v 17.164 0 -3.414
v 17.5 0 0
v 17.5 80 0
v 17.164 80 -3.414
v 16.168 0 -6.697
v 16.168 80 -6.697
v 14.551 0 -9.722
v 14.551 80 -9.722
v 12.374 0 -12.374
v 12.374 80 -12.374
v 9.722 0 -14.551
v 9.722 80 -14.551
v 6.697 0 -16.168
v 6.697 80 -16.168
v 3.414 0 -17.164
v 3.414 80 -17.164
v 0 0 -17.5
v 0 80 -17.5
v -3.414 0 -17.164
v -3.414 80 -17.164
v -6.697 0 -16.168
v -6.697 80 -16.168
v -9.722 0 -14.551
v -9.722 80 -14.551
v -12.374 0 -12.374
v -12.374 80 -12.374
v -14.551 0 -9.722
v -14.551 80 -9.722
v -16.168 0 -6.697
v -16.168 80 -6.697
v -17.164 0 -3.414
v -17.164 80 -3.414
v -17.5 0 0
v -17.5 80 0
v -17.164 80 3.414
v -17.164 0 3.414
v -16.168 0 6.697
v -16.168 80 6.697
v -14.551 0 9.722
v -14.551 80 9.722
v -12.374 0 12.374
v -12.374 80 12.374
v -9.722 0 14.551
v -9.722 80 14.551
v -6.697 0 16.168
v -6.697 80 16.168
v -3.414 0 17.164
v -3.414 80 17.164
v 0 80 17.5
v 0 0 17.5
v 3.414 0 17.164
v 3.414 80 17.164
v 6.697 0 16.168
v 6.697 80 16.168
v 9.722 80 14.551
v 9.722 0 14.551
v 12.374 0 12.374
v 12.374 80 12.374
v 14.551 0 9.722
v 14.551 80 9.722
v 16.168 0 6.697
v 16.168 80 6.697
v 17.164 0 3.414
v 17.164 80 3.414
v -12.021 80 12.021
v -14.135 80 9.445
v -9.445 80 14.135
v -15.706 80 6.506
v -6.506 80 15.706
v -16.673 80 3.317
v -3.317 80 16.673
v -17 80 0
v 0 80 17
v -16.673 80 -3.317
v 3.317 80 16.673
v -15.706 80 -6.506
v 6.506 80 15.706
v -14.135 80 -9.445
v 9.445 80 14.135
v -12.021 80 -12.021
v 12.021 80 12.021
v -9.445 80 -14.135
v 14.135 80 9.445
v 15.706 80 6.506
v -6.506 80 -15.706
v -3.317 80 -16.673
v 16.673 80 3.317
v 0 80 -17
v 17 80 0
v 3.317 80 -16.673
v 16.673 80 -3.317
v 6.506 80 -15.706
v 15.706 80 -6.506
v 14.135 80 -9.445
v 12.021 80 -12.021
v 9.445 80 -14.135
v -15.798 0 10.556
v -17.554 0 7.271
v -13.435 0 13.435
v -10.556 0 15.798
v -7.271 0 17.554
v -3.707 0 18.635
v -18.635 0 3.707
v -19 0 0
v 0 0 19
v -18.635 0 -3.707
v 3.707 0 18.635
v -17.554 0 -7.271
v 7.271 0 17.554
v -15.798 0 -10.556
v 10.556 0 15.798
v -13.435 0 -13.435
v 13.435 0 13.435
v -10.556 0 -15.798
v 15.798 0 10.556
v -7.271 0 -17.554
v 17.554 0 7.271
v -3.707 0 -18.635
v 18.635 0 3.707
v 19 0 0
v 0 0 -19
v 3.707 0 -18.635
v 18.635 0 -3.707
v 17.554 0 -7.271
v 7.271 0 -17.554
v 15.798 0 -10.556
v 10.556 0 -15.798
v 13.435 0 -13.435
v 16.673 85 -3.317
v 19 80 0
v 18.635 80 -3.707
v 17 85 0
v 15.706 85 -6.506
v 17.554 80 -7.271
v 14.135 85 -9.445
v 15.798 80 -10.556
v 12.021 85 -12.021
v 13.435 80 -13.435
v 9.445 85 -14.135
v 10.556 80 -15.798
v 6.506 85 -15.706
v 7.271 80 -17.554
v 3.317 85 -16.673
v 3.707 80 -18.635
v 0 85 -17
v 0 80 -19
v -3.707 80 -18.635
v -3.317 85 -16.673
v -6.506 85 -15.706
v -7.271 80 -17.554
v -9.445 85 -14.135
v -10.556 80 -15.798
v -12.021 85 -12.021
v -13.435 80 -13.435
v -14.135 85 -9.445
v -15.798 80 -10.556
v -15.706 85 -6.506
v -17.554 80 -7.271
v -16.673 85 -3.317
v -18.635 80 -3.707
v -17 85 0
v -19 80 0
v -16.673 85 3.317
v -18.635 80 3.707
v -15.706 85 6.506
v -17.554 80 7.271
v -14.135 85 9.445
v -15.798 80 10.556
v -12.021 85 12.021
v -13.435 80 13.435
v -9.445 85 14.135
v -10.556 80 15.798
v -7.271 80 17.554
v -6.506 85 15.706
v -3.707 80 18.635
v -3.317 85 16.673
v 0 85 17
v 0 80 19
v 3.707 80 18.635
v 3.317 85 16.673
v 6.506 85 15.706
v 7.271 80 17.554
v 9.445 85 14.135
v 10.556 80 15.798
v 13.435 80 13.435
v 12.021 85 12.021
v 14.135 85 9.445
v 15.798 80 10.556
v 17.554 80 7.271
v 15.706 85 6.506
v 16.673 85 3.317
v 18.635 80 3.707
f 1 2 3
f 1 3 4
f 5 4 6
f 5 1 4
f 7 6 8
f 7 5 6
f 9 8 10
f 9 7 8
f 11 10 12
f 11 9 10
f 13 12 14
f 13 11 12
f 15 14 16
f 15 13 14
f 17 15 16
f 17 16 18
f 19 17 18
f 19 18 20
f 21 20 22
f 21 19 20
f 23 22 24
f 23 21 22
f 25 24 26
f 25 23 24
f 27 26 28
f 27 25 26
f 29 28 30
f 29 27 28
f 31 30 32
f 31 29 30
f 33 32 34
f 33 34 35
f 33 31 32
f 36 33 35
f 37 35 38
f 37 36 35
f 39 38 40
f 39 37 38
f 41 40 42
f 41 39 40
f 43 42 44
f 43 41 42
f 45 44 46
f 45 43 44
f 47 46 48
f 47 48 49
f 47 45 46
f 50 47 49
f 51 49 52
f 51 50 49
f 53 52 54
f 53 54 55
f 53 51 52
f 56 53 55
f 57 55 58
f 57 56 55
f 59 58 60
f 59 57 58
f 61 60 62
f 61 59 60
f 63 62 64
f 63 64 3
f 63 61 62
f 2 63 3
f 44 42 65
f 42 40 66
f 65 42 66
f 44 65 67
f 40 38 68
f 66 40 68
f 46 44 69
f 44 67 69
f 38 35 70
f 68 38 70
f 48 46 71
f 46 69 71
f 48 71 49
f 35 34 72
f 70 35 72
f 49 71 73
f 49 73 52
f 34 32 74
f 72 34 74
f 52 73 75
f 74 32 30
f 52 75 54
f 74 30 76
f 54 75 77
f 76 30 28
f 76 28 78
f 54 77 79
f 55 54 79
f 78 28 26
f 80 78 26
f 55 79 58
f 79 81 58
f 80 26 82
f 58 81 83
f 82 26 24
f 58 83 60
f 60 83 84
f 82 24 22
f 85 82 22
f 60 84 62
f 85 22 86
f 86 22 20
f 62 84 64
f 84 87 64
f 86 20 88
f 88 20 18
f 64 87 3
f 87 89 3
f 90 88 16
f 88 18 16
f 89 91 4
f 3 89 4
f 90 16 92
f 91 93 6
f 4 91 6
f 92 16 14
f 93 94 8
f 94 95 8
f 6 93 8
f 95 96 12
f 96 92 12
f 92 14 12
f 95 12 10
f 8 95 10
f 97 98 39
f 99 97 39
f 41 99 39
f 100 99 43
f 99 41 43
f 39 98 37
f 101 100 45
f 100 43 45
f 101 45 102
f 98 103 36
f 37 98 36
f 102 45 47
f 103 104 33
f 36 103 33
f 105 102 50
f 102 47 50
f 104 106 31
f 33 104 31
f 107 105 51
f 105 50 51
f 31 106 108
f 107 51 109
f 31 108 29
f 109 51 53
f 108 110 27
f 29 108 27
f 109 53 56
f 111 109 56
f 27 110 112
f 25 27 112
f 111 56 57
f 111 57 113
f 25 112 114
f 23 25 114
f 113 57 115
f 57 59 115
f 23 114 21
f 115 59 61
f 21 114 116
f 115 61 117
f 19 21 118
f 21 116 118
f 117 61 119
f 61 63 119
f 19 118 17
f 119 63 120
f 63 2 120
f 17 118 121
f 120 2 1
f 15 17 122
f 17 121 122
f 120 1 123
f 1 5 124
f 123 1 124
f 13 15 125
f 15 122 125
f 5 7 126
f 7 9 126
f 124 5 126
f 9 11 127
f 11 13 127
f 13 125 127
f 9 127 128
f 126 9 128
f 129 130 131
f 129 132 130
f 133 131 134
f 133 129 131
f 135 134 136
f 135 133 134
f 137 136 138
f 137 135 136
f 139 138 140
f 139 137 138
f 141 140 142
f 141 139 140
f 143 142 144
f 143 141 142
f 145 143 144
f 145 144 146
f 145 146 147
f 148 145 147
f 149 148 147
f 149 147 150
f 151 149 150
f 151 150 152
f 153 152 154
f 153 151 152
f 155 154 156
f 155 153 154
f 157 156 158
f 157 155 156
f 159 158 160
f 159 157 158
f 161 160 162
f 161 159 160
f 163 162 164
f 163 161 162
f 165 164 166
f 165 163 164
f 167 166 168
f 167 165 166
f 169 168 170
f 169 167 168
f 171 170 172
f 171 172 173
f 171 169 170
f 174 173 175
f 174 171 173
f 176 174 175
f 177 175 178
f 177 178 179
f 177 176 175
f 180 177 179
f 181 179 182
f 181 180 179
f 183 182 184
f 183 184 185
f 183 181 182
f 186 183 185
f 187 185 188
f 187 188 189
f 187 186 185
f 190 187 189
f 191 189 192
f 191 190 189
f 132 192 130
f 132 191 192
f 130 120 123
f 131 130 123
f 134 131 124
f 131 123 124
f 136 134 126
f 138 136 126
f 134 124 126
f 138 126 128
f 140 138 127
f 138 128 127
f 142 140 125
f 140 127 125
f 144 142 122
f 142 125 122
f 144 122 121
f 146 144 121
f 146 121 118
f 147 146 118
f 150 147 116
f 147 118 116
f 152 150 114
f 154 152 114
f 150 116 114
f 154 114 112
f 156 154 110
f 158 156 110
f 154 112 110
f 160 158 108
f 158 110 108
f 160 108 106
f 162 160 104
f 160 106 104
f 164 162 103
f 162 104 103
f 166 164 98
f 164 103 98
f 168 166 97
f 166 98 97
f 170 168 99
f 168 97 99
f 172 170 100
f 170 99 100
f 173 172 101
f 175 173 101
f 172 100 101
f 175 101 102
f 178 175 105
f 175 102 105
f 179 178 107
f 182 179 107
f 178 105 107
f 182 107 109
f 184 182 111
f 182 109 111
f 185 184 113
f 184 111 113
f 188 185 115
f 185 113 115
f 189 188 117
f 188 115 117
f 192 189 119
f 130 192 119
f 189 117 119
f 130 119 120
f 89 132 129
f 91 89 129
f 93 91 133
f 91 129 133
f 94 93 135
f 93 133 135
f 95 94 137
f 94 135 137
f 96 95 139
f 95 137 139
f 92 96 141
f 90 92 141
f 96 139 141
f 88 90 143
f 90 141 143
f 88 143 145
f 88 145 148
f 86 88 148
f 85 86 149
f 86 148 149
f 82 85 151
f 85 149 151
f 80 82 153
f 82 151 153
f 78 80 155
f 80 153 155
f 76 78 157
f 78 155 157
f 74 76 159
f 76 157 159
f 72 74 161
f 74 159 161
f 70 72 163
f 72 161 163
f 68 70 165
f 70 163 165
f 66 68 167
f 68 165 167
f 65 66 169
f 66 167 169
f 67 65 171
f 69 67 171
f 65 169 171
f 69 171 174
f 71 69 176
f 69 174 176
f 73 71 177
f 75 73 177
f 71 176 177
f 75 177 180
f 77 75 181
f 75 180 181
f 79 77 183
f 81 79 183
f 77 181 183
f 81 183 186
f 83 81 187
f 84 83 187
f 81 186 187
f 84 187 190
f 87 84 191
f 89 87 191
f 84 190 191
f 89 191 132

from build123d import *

# Parameters (mm, degrees)
SKETCH_1_R          = 19
SKETCH_1_R_2        = 17.5
EXTRUDE_1_DEPTH     = 80
SKETCH_3_R          = 19
SKETCH_2_R          = 17
SKETCH_4_R          = 17
CUT_EXTRUDE_1_DEPTH = 5


with BuildPart() as part:
    # Эскиз1 → Бобышка-Вытянуть1 (new body)
    with BuildSketch(Plane(origin=(0, 0, 0), x_dir=(1, 0, 0), z_dir=(0, 1, 0))):
        Circle(SKETCH_1_R)
        Circle(SKETCH_1_R_2, mode=Mode.SUBTRACT)
    extrude(amount=EXTRUDE_1_DEPTH)

    # Эскиз3 → По сечениям1 section 0
    with BuildSketch(Plane(origin=(0, 80, 0), x_dir=(1, 0, 0), z_dir=(0, 1, 0))):
        Circle(SKETCH_3_R)
    # Эскиз2 → По сечениям1 section 1
    with BuildSketch(Plane(origin=(0, 85, 0), x_dir=(1, 0, 0), z_dir=(0, 1, 0))):
        Circle(SKETCH_2_R)
    loft()

    # Эскиз4 → Вырез-Вытянуть1 (cut)
    with BuildSketch(Plane(origin=(0, 85, 0), x_dir=(1, 0, 0), z_dir=(0, 1, 0))):
        Circle(SKETCH_4_R)
    extrude(amount=-CUT_EXTRUDE_1_DEPTH, mode=Mode.SUBTRACT)


solid = part.part
